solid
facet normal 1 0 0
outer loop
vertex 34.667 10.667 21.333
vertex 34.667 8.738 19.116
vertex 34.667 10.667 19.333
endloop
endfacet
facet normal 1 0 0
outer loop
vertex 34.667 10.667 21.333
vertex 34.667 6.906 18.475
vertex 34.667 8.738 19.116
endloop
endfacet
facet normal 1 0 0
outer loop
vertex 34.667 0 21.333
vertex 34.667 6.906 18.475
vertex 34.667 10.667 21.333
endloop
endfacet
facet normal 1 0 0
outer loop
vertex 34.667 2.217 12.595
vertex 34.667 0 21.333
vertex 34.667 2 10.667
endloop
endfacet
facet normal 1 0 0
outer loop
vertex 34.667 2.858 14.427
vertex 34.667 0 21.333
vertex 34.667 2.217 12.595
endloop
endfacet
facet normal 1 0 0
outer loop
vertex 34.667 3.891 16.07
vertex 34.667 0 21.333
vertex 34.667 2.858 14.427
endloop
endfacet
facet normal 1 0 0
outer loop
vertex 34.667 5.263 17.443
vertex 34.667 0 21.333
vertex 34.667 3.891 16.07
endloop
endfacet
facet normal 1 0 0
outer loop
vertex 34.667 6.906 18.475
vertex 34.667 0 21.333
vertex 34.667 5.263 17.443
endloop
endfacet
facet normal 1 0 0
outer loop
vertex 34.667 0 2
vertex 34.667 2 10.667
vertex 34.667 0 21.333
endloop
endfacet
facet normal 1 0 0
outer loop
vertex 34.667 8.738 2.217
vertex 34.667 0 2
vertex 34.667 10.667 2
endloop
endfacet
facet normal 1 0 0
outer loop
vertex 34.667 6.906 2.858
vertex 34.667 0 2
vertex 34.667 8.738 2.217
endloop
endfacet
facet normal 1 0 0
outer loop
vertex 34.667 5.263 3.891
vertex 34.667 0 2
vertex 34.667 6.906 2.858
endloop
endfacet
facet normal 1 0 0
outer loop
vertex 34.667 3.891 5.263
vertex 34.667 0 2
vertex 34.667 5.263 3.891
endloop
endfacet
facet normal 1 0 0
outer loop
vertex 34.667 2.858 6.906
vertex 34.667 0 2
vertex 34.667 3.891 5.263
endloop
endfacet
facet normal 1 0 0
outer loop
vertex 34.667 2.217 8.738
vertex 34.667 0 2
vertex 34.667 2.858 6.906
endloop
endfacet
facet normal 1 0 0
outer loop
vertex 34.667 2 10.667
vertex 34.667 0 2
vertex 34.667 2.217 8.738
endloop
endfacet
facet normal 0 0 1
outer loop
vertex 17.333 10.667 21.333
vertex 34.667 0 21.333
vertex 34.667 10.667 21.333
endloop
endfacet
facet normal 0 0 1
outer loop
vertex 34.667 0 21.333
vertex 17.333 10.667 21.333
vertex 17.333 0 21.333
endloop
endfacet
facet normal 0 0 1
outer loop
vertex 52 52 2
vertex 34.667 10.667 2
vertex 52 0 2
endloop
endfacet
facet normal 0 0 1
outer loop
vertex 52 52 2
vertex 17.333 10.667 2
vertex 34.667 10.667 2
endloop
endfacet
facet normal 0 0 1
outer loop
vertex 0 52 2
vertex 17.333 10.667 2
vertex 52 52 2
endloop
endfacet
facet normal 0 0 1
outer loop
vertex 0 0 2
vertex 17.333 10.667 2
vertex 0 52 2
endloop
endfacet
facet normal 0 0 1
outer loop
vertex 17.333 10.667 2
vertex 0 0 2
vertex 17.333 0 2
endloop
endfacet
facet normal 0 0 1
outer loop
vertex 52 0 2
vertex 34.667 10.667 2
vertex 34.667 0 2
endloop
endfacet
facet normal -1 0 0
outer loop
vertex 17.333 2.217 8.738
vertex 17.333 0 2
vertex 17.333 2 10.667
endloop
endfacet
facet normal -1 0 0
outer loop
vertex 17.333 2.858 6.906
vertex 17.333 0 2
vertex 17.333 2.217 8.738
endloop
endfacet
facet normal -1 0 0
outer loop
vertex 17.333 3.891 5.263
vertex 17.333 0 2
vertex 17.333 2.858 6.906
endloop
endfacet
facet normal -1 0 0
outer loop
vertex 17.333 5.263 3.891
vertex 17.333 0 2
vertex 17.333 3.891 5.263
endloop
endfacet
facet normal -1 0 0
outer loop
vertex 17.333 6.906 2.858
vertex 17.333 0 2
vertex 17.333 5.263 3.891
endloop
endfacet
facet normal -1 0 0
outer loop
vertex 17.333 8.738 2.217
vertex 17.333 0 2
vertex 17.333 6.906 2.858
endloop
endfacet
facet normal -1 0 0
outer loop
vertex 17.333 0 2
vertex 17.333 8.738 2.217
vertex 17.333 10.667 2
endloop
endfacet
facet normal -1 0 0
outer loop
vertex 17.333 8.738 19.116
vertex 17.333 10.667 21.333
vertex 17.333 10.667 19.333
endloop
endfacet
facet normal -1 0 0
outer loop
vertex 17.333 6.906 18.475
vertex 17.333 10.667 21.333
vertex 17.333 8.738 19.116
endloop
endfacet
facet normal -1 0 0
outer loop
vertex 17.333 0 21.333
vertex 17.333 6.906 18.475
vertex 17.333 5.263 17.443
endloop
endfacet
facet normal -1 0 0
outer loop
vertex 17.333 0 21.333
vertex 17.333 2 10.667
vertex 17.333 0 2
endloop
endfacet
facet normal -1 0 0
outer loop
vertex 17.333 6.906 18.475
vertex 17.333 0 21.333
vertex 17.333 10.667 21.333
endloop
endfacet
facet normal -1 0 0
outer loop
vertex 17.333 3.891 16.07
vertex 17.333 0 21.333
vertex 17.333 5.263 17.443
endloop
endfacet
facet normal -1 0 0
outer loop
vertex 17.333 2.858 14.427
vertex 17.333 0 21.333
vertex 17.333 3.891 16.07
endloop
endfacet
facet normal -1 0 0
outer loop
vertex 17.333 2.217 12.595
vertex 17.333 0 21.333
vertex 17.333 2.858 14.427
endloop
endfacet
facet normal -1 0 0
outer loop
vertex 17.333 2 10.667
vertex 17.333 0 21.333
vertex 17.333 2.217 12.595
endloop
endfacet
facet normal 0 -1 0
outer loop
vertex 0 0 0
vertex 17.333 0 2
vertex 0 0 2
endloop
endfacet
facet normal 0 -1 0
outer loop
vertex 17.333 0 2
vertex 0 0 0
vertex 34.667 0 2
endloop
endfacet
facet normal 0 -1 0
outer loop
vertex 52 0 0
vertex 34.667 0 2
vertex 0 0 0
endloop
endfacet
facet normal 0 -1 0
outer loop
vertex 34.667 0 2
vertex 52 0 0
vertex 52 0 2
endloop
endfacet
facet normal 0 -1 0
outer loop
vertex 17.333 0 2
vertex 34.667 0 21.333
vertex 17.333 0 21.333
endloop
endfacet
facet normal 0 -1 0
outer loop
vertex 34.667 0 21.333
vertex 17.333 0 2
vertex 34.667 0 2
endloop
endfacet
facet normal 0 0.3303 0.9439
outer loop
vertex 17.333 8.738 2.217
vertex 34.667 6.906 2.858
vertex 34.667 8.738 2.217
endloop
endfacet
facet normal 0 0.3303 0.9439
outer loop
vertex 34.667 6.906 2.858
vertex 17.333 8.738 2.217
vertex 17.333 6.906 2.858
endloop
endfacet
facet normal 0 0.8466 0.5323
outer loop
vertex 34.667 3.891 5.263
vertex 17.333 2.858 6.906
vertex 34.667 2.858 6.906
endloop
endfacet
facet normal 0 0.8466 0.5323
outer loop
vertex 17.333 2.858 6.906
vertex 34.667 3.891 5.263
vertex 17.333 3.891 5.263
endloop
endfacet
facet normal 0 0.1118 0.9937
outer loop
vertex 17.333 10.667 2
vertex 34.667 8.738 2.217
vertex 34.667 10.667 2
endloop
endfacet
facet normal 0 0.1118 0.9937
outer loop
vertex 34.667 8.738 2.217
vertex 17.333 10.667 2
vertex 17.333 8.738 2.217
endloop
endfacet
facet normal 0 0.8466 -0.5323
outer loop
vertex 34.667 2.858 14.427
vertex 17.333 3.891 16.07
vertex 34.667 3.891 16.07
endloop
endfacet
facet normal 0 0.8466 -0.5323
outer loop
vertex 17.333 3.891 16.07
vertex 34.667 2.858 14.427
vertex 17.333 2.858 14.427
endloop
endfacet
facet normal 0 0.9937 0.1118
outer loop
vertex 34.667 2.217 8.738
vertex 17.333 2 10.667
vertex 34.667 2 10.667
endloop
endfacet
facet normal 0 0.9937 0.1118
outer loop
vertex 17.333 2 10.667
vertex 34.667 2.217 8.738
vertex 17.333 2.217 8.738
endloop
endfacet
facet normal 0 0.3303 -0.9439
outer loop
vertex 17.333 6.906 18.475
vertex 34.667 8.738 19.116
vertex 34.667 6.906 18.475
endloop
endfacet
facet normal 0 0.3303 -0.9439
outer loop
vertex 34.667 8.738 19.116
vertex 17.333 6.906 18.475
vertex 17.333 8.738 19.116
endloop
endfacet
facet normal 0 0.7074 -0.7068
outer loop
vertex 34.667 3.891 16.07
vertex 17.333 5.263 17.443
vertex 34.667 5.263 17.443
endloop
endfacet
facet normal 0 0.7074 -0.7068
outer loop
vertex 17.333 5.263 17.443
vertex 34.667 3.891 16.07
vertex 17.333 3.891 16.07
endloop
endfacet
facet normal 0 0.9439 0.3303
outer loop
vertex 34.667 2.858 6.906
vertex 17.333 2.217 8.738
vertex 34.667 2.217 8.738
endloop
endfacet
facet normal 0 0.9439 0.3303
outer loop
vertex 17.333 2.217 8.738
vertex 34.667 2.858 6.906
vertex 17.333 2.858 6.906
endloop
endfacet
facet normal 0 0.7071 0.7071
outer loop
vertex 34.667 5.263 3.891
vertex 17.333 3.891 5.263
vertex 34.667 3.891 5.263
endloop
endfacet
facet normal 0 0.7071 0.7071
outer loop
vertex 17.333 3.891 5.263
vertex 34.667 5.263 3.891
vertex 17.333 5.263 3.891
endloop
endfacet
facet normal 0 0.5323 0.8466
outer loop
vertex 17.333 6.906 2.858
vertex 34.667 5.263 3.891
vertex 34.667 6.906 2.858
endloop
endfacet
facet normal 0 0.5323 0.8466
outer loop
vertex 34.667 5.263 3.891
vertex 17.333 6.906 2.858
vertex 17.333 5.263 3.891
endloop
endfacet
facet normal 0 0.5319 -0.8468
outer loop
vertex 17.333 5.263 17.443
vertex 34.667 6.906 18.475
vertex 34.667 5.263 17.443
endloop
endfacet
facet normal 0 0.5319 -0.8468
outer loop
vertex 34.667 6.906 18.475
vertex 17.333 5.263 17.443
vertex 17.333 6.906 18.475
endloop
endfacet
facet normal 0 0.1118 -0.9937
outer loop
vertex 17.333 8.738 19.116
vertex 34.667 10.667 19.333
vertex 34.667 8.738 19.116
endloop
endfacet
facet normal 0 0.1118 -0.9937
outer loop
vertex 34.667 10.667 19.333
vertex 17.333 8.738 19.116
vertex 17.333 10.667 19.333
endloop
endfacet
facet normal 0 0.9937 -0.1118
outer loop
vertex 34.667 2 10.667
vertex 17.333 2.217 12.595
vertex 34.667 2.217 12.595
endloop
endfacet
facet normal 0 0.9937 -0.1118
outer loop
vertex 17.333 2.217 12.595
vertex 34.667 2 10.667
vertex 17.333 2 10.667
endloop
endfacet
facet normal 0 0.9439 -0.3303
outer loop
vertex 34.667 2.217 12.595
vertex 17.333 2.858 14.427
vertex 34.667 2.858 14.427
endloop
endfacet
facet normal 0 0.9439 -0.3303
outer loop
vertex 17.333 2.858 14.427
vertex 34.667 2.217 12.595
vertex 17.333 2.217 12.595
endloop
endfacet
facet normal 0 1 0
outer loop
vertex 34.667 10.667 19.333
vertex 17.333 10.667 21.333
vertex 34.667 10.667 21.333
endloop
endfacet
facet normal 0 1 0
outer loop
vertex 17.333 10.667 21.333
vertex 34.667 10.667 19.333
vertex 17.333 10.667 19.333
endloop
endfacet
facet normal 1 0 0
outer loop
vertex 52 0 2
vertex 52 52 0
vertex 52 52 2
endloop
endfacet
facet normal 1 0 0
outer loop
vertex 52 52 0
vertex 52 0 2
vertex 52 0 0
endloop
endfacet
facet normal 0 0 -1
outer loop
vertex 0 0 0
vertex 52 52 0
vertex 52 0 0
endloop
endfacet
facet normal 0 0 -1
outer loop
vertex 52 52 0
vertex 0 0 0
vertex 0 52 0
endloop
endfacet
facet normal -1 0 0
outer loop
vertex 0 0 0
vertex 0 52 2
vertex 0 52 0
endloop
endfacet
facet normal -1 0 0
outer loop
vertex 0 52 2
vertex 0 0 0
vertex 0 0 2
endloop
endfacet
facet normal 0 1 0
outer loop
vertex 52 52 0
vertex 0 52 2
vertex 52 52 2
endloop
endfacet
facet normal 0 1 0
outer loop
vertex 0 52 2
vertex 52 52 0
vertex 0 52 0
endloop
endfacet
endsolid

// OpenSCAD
t=2.0;
//Breite Doppelklebeband
bdk=26;//25.2;
//Breite Klebefläche
bk=bdk*2;
hk=bk;
//Breite Hakenfläche
bh=bk/3;
//Tiefe Hakenfläche
th=bk/3;
//Hakenhoehe
hh=hk/3;

module klebeflaeche()
{
    cube([bk,hk,t]);
}

klebeflaeche();

module hakenflaeche()
{
    translate([bk/2-bh/2,0,t])
    cube([bh,t,th]);
}



module hakenhoehe()
{
    translate([bk/2-bh/2,0,th+t])
    cube([bh,hh,t]);
}

//hakenflaeche();
//hakenhoehe();

difference()
{
color("blue")
translate([bk/2-bh/2,0,t])
cube([bh,hh,th+t]);

color("red")
translate([bk/2-bh/2,th/2+t,th/2+t])
rotate([0,90,0])
cylinder(h=bh, d=th);

color("orange")
translate([bk/2-bh/2,hh/2+t,t])
cube([bh,hh,th+t]);
}
